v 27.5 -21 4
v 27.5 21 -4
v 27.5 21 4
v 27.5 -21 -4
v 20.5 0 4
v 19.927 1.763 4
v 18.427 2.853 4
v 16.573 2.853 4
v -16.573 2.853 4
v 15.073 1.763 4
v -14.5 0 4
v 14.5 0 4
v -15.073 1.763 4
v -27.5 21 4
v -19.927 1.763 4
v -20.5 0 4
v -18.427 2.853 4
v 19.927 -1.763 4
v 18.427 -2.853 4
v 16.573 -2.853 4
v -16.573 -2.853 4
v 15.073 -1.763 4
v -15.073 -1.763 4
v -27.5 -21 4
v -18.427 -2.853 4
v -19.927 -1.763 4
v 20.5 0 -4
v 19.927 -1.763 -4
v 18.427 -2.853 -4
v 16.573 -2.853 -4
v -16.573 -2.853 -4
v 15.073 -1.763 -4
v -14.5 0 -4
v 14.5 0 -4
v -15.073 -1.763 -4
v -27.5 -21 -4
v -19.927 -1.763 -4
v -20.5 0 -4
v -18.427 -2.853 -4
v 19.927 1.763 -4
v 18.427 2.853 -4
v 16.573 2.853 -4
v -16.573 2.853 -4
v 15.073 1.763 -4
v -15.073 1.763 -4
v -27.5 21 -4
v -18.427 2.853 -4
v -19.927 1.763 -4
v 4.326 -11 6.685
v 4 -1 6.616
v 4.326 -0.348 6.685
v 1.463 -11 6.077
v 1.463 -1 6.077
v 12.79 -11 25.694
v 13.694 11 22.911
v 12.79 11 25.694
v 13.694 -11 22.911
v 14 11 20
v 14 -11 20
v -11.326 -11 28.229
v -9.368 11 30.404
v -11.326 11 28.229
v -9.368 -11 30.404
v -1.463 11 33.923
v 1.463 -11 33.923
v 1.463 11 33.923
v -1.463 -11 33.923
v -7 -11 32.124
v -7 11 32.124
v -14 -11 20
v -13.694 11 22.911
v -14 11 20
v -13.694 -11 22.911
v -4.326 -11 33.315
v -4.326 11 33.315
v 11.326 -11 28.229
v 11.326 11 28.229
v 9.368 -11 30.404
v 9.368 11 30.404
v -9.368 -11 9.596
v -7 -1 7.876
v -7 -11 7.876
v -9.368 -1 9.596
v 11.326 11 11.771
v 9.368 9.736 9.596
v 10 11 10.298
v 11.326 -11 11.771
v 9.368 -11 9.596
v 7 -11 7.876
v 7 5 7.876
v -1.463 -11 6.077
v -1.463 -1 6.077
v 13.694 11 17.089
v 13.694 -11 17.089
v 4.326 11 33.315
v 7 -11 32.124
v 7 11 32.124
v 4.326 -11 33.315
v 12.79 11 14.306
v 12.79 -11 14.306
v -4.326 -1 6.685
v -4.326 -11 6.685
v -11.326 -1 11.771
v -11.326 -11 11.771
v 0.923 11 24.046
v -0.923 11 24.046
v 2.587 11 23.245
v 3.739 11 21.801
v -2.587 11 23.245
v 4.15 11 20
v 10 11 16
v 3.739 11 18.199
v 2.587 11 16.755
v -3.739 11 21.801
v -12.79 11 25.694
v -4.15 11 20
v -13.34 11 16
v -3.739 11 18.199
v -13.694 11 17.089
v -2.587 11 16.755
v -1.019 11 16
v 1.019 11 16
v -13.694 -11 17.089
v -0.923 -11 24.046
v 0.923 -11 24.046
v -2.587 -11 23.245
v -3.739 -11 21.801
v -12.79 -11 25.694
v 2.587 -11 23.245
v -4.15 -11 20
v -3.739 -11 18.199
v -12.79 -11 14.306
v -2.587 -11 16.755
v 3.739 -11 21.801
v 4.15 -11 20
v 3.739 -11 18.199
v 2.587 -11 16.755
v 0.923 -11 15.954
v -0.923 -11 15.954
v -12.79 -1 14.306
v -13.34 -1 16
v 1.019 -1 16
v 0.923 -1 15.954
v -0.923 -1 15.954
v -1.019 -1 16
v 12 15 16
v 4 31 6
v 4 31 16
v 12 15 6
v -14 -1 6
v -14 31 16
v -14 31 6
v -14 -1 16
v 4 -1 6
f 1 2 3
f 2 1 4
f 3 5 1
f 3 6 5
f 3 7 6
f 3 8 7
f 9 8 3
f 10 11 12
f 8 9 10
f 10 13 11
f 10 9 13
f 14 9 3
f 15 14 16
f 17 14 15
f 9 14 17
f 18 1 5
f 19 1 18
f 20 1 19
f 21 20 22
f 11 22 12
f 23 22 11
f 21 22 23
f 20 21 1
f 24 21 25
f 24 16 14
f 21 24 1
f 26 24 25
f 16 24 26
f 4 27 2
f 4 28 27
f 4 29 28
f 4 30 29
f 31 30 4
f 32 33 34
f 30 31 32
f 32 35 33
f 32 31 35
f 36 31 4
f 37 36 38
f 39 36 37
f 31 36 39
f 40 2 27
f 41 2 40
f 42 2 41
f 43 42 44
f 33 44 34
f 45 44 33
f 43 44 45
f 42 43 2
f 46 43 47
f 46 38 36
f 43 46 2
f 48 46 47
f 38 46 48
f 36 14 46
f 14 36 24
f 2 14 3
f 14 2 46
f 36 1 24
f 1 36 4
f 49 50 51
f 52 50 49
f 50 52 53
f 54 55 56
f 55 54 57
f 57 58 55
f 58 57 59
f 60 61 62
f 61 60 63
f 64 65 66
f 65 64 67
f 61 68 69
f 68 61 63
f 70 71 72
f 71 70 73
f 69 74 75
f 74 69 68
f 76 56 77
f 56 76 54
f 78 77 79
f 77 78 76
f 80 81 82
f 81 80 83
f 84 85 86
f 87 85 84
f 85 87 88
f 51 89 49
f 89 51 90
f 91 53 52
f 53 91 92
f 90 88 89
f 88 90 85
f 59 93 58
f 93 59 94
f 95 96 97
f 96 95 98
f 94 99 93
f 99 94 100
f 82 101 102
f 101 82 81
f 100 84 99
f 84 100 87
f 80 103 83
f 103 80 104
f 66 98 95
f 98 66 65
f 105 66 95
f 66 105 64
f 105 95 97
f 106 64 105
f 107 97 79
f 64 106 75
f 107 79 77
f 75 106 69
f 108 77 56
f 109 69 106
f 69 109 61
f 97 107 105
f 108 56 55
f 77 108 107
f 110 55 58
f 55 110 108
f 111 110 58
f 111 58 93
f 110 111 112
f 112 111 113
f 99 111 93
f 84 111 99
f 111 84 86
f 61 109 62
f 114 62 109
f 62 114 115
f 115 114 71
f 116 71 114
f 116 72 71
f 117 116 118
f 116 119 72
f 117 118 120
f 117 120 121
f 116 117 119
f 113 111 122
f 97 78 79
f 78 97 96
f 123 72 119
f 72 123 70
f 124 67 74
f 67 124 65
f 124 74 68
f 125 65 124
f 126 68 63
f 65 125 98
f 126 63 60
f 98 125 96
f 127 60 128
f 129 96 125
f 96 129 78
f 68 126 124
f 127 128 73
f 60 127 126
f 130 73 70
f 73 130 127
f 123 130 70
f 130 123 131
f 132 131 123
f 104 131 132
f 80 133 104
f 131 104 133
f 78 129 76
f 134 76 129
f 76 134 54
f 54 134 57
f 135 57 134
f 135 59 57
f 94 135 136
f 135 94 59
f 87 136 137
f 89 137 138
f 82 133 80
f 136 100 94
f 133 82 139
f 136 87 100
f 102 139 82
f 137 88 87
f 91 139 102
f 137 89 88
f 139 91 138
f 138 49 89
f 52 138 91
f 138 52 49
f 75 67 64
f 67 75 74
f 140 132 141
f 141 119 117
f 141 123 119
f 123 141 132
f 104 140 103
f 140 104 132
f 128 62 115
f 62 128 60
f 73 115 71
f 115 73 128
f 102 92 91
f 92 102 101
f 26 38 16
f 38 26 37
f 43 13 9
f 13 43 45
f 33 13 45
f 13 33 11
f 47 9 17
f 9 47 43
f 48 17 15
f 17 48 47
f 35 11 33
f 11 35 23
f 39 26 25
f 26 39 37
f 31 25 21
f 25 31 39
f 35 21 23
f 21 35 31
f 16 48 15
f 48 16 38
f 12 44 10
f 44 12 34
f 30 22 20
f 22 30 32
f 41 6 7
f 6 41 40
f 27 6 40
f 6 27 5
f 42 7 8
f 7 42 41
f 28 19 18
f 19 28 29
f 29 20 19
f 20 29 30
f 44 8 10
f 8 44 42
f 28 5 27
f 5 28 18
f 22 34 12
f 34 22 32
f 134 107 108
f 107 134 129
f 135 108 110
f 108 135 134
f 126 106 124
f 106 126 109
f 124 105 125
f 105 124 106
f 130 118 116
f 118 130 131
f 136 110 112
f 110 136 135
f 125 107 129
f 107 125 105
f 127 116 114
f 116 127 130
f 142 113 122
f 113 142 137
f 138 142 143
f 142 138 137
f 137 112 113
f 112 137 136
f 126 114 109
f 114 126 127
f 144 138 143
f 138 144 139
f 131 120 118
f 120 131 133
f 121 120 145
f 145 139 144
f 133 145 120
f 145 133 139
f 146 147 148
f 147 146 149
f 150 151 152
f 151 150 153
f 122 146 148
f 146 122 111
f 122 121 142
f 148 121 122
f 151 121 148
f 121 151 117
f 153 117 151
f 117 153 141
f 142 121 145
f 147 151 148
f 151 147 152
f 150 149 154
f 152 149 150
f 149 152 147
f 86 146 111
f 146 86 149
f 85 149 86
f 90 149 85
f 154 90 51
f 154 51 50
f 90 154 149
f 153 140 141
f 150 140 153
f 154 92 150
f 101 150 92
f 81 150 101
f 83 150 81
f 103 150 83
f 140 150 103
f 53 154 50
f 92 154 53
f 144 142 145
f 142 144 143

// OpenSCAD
// Parameters
shaft_diameter_mm = 8; //[4:16:0.5]
base_length_mm = 55; //[28:110:1]
base_width_mm = 42; //[21:84:1]
base_thickness_mm = 8; //[4:16:0.5]
housing_outer_diameter_mm = 28; //[16:56:0.5]
housing_length_mm = 22; //[12:44:0.5]
housing_center_height_mm = 24; //[12:48:0.5]
mounting_hole_diameter_mm = 6; //[3:12:0.5]
mounting_hole_edge_margin_x_mm = 10; //[5:20:0.5]
mounting_hole_y_offset_mm = 0; //[-10:10:0.5]
trapezoid_top_width_mm = 18; //[10:36:0.5]
trapezoid_base_width_mm = 26; //[14:52:0.5]
rib_height_mm = 16; //[8:32:0.5]
rib_thickness_y_mm = 10; //[6:20:0.5]
overlap_mm = 1; //[0.5:2:0.1]
bore_clearance_mm = 0.3; //[0:1:0.05]

// Right Trapezoid
module right_trapezoid() {
  color("Silver") {
    linear_extrude(height=rib_thickness_y_mm, center=true) {
      polygon(points=[
        [0, 0],
        [trapezoid_base_width_mm, 0],
        [trapezoid_top_width_mm, rib_height_mm],
        [0, rib_height_mm]
      ]);
    }
  }
}

// KP Pillow Block
module kp_pillow_block() {
  color("DimGray") {
    // Mounting Base
    translate([0, 0, 0])
      cube([base_length_mm, base_width_mm, base_thickness_mm], center=true);
    
    // Bearing Housing Outer
    translate([0, 0, (-base_thickness_mm/2) + housing_center_height_mm])
      rotate([90, 0, 0])
      cylinder(r=housing_outer_diameter_mm/2, h=housing_length_mm, center=true);
  }
}

// KP Pillow Block Hole Positions
module kp_pillow_block_hole_positions() {
  color("Black") {
    // Mounting Holes
    translate([(-base_length_mm/2) + mounting_hole_edge_margin_x_mm, mounting_hole_y_offset_mm, 0])
      cylinder(r=mounting_hole_diameter_mm/2, h=base_thickness_mm + 2*overlap_mm, center=true);
    translate([(base_length_mm/2) - mounting_hole_edge_margin_x_mm, mounting_hole_y_offset_mm, 0])
      cylinder(r=mounting_hole_diameter_mm/2, h=base_thickness_mm + 2*overlap_mm, center=true);
  }
}

// KP Pillow Block Assembly
module kp_pillow_block_assembly() {
  difference() {
    kp_pillow_block();
    // Bearing Housing Bore
    translate([0, 0, (-base_thickness_mm/2) + housing_center_height_mm])
      rotate([90, 0, 0])
      cylinder(r=(shaft_diameter_mm + bore_clearance_mm)/2, h=housing_length_mm + 2*overlap_mm, center=true);
    kp_pillow_block_hole_positions();
  }
}

// SBR Bearing Block Assembly
module sbr_bearing_block_assembly() {
  union() {
    kp_pillow_block_assembly();
    // Left Rib
    translate([(-trapezoid_base_width_mm/2) - overlap_mm, (base_width_mm/2) - (rib_thickness_y_mm/2) - overlap_mm, (base_thickness_mm/2) + (rib_height_mm/2) - overlap_mm])
      right_trapezoid();
    // Right Rib
    mirror([0, 1, 0])
      translate([(-trapezoid_base_width_mm/2) - overlap_mm, (-base_width_mm/2) + (rib_thickness_y_mm/2) + overlap_mm, (base_thickness_mm/2) + (rib_height_mm/2) - overlap_mm])
      right_trapezoid();
  }
}

// Final Assembly
module assembly() {
  sbr_bearing_block_assembly();
}

assembly();
